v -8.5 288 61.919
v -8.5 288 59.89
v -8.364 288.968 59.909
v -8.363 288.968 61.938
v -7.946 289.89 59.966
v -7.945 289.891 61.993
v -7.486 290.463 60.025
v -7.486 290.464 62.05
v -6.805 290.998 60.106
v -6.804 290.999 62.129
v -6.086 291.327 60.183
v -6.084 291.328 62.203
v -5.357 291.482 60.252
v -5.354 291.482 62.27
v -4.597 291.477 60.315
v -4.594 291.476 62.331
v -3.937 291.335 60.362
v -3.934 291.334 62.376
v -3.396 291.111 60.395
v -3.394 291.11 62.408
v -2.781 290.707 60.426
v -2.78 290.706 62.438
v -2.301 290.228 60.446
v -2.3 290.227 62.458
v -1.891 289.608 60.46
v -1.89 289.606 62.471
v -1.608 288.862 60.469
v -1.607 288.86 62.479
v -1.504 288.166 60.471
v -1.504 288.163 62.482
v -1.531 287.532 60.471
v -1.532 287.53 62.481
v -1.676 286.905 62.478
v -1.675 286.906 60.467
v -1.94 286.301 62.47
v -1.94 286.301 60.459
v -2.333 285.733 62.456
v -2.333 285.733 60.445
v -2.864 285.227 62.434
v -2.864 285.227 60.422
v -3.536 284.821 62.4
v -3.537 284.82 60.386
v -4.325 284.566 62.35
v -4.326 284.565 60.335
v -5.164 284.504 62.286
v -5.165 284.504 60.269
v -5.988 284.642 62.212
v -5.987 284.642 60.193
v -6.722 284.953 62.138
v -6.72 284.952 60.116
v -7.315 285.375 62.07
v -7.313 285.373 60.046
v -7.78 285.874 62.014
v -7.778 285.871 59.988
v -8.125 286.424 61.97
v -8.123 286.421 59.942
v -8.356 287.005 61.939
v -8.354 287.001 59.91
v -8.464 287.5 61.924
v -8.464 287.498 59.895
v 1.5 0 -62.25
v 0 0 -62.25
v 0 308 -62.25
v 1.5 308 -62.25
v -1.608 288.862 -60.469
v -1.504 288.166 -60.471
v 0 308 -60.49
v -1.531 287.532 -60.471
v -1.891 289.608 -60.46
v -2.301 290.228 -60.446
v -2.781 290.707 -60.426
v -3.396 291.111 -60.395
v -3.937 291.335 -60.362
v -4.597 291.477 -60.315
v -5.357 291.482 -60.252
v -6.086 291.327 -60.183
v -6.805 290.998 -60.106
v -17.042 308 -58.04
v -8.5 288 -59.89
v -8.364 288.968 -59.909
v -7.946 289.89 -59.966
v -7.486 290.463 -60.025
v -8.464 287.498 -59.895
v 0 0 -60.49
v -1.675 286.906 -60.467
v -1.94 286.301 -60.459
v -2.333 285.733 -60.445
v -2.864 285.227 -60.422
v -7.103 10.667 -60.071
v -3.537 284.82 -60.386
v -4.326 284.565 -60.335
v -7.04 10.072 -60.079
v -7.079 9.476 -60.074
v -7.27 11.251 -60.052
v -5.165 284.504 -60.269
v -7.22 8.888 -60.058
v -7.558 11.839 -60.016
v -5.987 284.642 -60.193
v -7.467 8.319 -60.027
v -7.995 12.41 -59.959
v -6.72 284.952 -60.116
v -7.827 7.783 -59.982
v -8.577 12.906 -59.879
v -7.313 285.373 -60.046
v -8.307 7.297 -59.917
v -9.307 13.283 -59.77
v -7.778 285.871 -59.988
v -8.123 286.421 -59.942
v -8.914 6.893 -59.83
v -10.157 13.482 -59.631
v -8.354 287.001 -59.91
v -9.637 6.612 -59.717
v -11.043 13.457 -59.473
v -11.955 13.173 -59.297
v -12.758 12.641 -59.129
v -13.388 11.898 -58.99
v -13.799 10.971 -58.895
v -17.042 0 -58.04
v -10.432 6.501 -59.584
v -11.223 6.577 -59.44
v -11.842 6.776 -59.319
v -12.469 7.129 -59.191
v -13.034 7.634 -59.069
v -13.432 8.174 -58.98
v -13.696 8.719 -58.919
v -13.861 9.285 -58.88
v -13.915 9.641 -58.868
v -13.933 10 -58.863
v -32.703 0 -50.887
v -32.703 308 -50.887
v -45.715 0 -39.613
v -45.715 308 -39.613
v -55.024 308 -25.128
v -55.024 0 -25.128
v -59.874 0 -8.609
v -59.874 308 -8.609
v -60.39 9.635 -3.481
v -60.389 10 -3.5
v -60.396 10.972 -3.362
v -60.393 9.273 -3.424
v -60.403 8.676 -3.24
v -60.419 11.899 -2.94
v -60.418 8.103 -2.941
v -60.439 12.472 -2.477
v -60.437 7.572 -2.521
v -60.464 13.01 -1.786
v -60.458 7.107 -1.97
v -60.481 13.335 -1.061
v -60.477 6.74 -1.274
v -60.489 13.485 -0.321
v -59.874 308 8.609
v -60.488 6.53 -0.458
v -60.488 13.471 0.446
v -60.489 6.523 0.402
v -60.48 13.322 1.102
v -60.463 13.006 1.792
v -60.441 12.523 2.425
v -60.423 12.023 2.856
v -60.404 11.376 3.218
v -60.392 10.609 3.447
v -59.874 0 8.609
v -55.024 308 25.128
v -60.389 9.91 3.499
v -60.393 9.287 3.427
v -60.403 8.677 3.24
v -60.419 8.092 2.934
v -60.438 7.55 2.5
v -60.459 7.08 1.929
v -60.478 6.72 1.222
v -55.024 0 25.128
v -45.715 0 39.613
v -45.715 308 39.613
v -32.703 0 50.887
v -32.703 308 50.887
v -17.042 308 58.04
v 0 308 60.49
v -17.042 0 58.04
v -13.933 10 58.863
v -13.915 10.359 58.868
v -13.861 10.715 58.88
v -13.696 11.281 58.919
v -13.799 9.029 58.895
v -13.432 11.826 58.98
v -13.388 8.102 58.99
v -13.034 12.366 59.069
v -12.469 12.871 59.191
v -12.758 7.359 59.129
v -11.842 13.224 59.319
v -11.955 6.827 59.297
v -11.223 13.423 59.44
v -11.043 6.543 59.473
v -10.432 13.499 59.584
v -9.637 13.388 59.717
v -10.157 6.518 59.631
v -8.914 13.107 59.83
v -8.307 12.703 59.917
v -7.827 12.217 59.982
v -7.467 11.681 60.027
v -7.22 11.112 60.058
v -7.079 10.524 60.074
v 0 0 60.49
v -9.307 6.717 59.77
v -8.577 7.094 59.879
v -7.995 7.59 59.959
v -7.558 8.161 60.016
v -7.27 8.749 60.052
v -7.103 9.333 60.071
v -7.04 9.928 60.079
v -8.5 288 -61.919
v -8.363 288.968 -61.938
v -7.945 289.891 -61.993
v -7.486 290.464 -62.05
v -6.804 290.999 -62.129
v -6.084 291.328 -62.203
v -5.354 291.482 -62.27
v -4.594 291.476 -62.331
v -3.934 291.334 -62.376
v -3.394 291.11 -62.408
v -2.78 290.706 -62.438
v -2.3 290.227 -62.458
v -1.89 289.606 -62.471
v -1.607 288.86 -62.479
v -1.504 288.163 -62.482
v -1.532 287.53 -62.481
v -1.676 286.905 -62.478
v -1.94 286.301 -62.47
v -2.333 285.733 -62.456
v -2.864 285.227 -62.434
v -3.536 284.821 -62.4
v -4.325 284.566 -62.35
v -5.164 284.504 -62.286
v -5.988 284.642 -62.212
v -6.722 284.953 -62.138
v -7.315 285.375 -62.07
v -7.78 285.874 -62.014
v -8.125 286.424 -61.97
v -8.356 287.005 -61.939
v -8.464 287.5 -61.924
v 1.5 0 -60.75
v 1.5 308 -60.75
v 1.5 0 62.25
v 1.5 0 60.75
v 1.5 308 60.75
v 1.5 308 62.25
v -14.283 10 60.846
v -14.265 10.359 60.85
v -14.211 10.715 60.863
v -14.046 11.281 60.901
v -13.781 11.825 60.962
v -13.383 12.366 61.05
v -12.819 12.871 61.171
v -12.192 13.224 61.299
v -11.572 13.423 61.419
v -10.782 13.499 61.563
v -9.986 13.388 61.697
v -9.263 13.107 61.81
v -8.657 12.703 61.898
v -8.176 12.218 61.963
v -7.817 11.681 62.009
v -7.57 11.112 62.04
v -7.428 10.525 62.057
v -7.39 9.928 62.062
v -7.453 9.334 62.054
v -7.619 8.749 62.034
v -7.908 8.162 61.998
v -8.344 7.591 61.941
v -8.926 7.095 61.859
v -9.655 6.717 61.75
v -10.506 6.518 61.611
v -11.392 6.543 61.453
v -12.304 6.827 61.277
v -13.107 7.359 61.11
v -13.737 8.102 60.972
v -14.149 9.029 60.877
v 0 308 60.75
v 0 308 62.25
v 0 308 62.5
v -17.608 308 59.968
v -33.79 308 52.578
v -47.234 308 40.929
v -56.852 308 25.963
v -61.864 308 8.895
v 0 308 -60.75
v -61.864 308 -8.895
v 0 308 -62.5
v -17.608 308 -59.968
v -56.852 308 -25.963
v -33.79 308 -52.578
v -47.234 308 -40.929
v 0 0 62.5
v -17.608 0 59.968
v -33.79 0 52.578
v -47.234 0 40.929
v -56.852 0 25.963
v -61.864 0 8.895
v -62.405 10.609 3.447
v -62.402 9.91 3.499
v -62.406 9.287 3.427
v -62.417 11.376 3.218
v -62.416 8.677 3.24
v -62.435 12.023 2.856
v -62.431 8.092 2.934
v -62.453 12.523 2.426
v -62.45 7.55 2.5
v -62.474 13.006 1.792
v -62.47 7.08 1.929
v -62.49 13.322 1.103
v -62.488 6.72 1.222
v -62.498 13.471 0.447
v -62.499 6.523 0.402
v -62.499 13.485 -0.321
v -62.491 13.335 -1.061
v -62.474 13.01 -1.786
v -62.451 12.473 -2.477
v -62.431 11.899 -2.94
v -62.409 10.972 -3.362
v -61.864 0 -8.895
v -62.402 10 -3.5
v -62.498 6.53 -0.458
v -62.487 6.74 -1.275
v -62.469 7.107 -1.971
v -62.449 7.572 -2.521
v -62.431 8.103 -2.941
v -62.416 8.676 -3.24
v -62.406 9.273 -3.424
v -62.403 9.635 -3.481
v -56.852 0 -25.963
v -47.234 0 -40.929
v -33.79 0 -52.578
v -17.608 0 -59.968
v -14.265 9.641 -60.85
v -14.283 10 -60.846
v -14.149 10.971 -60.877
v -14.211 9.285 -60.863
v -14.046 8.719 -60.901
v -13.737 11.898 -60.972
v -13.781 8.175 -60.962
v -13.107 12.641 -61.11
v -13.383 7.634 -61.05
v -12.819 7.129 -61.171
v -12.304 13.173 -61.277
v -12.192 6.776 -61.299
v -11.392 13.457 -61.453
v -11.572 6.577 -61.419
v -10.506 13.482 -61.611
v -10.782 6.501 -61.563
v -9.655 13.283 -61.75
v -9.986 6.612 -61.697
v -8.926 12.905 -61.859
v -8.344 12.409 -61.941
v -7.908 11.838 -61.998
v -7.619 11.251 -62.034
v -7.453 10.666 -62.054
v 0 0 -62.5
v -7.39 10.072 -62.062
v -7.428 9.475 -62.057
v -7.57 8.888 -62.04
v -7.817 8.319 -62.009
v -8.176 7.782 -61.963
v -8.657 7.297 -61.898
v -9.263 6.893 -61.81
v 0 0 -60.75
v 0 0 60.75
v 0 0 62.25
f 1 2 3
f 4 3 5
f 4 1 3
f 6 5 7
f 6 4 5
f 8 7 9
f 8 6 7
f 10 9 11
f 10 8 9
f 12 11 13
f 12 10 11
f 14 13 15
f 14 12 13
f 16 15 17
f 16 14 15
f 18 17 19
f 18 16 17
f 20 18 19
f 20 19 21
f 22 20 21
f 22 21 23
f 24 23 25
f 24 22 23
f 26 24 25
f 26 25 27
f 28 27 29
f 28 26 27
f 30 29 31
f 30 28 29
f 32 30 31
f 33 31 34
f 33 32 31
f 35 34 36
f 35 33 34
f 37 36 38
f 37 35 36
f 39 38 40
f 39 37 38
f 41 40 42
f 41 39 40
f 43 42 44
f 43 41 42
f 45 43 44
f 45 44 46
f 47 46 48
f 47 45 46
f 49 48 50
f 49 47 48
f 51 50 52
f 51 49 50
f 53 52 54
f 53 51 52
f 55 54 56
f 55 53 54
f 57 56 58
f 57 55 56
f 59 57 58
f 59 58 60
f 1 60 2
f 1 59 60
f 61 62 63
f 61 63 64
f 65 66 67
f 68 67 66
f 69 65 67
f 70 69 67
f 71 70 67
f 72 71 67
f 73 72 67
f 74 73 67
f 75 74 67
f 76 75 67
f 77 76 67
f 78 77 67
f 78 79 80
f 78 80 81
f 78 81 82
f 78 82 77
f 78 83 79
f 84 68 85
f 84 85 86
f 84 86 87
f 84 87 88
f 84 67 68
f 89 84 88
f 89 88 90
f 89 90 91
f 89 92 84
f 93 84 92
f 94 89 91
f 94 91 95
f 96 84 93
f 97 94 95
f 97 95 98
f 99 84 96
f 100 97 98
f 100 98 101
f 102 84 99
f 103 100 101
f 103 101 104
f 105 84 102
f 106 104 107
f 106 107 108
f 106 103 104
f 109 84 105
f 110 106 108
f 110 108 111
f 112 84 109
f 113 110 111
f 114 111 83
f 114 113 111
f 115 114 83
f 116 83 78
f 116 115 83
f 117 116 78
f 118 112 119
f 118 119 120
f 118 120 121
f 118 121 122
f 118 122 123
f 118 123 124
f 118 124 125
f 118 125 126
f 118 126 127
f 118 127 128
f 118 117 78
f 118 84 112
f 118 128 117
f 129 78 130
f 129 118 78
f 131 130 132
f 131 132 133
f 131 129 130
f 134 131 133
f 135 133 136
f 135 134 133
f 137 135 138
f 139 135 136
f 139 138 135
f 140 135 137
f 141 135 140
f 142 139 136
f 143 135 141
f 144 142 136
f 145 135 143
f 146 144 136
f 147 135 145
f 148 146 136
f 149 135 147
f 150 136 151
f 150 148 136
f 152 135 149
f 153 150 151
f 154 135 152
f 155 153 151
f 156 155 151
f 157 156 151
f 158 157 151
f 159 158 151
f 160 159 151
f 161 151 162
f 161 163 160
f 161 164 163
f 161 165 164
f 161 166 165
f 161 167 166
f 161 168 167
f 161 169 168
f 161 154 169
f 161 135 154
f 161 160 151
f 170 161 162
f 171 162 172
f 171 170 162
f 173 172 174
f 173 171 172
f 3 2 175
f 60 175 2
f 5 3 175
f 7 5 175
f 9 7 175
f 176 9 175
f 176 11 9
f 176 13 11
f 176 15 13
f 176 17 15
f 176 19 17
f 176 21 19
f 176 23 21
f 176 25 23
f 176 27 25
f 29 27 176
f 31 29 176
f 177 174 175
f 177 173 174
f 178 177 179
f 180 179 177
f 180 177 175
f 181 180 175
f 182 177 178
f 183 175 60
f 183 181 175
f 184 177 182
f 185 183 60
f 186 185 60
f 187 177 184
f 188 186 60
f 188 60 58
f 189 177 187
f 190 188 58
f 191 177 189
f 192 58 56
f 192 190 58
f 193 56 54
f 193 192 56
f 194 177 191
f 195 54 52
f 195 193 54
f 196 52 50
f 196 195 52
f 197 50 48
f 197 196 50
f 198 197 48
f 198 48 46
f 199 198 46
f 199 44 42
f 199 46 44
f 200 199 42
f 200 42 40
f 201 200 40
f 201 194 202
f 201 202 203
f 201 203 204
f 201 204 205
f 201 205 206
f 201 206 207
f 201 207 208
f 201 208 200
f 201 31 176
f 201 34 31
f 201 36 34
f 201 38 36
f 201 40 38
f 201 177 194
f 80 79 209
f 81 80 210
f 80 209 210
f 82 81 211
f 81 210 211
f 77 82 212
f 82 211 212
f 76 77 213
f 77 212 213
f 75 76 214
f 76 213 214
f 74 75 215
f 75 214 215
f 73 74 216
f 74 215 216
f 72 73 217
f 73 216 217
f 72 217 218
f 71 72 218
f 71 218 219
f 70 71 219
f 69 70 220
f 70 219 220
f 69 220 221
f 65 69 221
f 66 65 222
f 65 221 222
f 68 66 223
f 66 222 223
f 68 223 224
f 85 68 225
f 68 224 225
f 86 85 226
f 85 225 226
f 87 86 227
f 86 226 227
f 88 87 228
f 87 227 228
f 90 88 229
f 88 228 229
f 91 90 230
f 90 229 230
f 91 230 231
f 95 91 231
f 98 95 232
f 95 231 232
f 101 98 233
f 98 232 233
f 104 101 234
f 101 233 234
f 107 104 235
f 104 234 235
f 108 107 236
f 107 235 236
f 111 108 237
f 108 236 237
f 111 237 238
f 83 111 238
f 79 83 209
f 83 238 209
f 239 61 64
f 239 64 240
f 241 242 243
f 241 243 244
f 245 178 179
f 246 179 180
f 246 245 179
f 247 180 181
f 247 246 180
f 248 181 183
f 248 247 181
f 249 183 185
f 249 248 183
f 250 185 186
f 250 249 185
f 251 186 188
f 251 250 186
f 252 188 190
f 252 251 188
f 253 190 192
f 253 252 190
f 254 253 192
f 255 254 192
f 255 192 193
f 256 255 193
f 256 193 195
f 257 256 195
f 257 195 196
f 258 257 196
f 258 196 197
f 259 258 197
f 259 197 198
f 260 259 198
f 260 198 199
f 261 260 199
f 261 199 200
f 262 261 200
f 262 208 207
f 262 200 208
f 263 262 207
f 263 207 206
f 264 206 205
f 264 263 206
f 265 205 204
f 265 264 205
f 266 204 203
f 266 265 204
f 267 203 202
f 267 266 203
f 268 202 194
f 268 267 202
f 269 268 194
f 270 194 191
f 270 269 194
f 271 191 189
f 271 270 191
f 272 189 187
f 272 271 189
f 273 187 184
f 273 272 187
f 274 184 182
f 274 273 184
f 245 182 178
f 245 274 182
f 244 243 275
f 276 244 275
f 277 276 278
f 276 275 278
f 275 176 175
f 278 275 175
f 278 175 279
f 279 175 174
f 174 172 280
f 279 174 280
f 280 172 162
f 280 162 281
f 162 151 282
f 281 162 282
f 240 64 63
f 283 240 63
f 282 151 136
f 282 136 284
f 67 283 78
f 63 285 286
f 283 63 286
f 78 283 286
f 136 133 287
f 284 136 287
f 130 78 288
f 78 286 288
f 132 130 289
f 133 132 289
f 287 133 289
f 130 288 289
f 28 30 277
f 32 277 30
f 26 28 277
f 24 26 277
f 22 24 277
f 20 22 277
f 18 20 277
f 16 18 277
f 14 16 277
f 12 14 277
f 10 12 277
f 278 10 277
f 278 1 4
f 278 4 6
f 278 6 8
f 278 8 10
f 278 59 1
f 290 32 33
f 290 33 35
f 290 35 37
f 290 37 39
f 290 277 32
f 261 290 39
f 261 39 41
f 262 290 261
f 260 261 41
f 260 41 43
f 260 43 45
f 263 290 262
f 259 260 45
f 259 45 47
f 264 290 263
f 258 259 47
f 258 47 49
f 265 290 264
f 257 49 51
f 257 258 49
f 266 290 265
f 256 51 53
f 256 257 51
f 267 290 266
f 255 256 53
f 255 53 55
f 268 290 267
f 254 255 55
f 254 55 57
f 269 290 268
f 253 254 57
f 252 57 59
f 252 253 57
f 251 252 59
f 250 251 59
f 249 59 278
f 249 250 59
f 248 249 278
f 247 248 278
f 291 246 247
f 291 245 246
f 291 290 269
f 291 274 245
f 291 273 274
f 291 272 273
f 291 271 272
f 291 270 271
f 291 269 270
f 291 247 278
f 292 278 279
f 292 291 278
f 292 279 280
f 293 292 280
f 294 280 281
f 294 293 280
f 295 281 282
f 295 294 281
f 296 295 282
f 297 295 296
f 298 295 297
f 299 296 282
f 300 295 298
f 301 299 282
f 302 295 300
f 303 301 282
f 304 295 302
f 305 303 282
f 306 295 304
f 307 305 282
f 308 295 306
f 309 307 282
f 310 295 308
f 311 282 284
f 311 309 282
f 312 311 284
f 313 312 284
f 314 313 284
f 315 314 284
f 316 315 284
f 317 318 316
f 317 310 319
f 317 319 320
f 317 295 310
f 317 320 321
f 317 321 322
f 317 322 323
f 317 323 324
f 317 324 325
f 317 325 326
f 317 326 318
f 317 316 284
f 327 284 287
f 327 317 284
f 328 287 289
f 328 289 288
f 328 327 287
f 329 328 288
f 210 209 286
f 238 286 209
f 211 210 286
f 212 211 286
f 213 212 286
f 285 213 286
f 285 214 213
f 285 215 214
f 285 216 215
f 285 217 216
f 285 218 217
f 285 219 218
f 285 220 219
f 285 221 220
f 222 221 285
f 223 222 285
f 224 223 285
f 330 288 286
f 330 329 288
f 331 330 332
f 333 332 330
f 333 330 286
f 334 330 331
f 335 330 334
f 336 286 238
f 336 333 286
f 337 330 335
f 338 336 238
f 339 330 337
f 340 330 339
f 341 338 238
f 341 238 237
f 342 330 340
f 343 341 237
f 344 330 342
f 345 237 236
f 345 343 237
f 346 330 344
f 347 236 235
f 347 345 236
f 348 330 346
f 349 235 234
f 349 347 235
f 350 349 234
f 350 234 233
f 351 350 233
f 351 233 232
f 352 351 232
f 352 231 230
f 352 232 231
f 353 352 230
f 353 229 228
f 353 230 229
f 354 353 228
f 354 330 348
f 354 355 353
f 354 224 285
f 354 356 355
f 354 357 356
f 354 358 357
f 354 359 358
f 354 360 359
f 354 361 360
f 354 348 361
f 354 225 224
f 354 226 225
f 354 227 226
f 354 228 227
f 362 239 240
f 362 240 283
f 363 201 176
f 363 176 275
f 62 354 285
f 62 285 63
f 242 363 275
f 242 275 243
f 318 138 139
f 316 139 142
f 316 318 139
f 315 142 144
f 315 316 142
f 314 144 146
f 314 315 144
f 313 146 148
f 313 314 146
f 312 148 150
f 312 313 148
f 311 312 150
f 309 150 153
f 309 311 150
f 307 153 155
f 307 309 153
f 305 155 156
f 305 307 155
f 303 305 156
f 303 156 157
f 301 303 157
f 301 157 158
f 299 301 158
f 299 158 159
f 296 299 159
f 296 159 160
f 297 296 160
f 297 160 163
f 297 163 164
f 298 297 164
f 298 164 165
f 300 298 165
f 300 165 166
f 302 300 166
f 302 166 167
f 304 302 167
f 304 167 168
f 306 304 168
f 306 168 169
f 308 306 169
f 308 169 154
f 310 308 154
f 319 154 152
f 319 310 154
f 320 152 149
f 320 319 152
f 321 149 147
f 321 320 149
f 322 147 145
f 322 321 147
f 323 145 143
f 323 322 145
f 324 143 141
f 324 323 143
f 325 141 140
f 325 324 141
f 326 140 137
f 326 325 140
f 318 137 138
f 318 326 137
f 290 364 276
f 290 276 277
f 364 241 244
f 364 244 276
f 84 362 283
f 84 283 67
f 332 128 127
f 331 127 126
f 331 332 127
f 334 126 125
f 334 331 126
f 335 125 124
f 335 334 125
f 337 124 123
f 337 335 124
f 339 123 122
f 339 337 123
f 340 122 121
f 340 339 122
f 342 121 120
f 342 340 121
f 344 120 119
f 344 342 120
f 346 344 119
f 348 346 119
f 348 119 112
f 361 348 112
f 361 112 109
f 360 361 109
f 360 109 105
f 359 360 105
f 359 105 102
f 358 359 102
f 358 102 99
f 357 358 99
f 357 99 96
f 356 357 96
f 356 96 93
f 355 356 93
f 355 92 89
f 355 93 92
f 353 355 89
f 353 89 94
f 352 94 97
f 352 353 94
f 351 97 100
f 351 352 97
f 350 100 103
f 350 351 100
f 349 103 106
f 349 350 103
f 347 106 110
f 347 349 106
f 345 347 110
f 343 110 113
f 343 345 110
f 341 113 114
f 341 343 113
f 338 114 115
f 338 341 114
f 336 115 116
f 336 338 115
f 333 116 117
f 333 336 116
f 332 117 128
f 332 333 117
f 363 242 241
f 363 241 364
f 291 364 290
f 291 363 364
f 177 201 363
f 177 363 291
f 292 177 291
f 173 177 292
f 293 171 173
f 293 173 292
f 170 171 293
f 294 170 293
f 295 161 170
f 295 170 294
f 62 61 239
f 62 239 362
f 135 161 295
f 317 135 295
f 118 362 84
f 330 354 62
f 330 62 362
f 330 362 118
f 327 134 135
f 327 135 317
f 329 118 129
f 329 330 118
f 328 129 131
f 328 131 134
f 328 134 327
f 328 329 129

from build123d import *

# Parameters (mm, degrees)
BOSS_EXTRUDE1_DEPTH     = 308
CUT_EXTRUDE1_START      = -62.5
SKETCH4_R               = 3.5
CUT_EXTRUDE1_DEPTH      = 2.111341
CIRPATTERN2_COUNT       = 2
CIRPATTERN2_ANGLE       = 80
MIRROR1_START           = -62.5
MIRROR1_COPY_1_SKETCH_R = 3.5
MIRROR1_COPY_1_DEPTH    = 2.111341
MIRROR1_COPY_2_SKETCH_R = 3.5
MIRROR1_COPY_2_DEPTH    = 2.111341
SKETCH5_R               = 3.5
CUT_EXTRUDE2_DEPTH      = 5


with BuildPart() as part:
    # Sketch3 → Boss-Extrude1 (new body)
    with BuildSketch(Plane(origin=(0, 0, 0), x_dir=(1, 0, 0), z_dir=(0, 1, 0))):
        with BuildLine():
            Line((0, -60.49), (0, -60.75))
            Line((0, -60.75), (1.5, -60.75))
            Line((1.5, -60.75), (1.5, -62.25))
            Line((1.5, -62.25), (0, -62.25))
            Line((0, -62.25), (0, -62.5))
            ThreePointArc((0, -62.5), (-62.5, 0), (0, 62.5))
            Line((0, 62.5), (0, 62.25))
            Line((0, 62.25), (1.5, 62.25))
            Line((1.5, 62.25), (1.5, 60.75))
            Line((1.5, 60.75), (0, 60.75))
            Line((0, 60.75), (0, 60.49))
            ThreePointArc((0, 60.49), (-60.49, 0), (0, -60.49))
        make_face()
    extrude(amount=BOSS_EXTRUDE1_DEPTH)

    # Sketch4 → Cut-Extrude1 (cut)
    with BuildSketch(Plane(origin=(0, 0, 0), x_dir=(0, 0, -1), z_dir=(1, 0, 0)).offset(CUT_EXTRUDE1_START)):
        with Locations((0, 10)):
            Circle(SKETCH4_R)
    cut_extrude1 = extrude(amount=CUT_EXTRUDE1_DEPTH, mode=Mode.SUBTRACT)

    # CirPattern2: Cut-Extrude1 ×2 about axis
    cirpattern2_axis = Axis((0, 0, 0), (0, 1, 0))
    for i in range(1, CIRPATTERN2_COUNT):
        add(cut_extrude1.rotate(cirpattern2_axis, i * CIRPATTERN2_ANGLE / (CIRPATTERN2_COUNT - 1)), mode=Mode.SUBTRACT)

    # Mirror1 copy 1 sketch → Mirror1 copy 1 (cut)
    with BuildSketch(Plane(origin=(0, 0, 0), x_dir=(-0.984807753, 0, 0.173648178), z_dir=(0.173648178, 0, 0.984807753)).offset(MIRROR1_START)):
        with Locations((0, -10)):
            Circle(MIRROR1_COPY_1_SKETCH_R)
    extrude(amount=MIRROR1_COPY_1_DEPTH, mode=Mode.SUBTRACT)

    # Mirror1 copy 2 sketch → Mirror1 copy 2 (cut)
    with BuildSketch(Plane(origin=(0, 0, 0), x_dir=(0, 0, 1), z_dir=(1, 0, 0)).offset(MIRROR1_START)):
        with Locations((0, -10)):
            Circle(MIRROR1_COPY_2_SKETCH_R)
    extrude(amount=MIRROR1_COPY_2_DEPTH, mode=Mode.SUBTRACT)

    # Sketch5 → Cut-Extrude2 (cut, symmetric)
    with BuildSketch(Plane(origin=(0, 0, -62.5), x_dir=(-1, 0, 0), z_dir=(0, 0, -1))):
        with Locations((5, 288)):
            Circle(SKETCH5_R)
    cut_extrude2 = extrude(amount=CUT_EXTRUDE2_DEPTH, both=True, mode=Mode.SUBTRACT)

    # Mirror2: Cut-Extrude2 across plane
    add(cut_extrude2.mirror(Plane.XY), mode=Mode.SUBTRACT)


solid = part.part
